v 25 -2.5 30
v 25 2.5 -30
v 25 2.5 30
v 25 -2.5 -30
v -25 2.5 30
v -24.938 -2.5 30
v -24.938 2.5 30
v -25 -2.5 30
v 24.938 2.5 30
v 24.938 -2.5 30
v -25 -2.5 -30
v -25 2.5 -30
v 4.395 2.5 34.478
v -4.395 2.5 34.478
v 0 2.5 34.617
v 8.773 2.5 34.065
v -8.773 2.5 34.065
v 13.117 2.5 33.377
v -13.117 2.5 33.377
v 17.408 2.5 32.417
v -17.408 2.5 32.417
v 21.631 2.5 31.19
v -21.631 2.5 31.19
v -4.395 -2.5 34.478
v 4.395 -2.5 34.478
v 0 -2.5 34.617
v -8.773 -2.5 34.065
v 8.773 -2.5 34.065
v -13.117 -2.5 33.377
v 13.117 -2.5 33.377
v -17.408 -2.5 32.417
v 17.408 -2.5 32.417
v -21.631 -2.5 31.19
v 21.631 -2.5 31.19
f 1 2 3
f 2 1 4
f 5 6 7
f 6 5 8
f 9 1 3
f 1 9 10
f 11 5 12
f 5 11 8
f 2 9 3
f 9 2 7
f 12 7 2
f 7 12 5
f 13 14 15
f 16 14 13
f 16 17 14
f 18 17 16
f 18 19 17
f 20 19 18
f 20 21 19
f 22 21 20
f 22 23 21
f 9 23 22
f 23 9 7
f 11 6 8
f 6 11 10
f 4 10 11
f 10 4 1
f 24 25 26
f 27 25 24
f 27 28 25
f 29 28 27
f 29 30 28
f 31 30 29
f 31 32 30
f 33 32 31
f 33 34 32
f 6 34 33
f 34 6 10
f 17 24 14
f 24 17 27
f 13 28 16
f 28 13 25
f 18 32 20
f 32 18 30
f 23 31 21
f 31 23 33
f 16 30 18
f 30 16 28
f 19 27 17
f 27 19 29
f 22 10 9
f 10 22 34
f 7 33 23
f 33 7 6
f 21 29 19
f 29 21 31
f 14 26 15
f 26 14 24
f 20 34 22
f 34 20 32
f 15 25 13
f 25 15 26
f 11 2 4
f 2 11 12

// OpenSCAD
$fn=100;

module front(height,width,thickness,radius){

translateR = sqrt(radius*radius-width*width/4);
	intersection(){
		translate([0,0,(radius)/2]){
			cube([width,thickness,height+radius],true);
		}
		union(){
			cube([width,thickness,height],true);
			translate([0,0,-translateR+height/2]){
				rotate([90,0,0]){
					cylinder(thickness,radius,radius,true);
				}
			}
		}
	}
}

front(60,50,5,70);
